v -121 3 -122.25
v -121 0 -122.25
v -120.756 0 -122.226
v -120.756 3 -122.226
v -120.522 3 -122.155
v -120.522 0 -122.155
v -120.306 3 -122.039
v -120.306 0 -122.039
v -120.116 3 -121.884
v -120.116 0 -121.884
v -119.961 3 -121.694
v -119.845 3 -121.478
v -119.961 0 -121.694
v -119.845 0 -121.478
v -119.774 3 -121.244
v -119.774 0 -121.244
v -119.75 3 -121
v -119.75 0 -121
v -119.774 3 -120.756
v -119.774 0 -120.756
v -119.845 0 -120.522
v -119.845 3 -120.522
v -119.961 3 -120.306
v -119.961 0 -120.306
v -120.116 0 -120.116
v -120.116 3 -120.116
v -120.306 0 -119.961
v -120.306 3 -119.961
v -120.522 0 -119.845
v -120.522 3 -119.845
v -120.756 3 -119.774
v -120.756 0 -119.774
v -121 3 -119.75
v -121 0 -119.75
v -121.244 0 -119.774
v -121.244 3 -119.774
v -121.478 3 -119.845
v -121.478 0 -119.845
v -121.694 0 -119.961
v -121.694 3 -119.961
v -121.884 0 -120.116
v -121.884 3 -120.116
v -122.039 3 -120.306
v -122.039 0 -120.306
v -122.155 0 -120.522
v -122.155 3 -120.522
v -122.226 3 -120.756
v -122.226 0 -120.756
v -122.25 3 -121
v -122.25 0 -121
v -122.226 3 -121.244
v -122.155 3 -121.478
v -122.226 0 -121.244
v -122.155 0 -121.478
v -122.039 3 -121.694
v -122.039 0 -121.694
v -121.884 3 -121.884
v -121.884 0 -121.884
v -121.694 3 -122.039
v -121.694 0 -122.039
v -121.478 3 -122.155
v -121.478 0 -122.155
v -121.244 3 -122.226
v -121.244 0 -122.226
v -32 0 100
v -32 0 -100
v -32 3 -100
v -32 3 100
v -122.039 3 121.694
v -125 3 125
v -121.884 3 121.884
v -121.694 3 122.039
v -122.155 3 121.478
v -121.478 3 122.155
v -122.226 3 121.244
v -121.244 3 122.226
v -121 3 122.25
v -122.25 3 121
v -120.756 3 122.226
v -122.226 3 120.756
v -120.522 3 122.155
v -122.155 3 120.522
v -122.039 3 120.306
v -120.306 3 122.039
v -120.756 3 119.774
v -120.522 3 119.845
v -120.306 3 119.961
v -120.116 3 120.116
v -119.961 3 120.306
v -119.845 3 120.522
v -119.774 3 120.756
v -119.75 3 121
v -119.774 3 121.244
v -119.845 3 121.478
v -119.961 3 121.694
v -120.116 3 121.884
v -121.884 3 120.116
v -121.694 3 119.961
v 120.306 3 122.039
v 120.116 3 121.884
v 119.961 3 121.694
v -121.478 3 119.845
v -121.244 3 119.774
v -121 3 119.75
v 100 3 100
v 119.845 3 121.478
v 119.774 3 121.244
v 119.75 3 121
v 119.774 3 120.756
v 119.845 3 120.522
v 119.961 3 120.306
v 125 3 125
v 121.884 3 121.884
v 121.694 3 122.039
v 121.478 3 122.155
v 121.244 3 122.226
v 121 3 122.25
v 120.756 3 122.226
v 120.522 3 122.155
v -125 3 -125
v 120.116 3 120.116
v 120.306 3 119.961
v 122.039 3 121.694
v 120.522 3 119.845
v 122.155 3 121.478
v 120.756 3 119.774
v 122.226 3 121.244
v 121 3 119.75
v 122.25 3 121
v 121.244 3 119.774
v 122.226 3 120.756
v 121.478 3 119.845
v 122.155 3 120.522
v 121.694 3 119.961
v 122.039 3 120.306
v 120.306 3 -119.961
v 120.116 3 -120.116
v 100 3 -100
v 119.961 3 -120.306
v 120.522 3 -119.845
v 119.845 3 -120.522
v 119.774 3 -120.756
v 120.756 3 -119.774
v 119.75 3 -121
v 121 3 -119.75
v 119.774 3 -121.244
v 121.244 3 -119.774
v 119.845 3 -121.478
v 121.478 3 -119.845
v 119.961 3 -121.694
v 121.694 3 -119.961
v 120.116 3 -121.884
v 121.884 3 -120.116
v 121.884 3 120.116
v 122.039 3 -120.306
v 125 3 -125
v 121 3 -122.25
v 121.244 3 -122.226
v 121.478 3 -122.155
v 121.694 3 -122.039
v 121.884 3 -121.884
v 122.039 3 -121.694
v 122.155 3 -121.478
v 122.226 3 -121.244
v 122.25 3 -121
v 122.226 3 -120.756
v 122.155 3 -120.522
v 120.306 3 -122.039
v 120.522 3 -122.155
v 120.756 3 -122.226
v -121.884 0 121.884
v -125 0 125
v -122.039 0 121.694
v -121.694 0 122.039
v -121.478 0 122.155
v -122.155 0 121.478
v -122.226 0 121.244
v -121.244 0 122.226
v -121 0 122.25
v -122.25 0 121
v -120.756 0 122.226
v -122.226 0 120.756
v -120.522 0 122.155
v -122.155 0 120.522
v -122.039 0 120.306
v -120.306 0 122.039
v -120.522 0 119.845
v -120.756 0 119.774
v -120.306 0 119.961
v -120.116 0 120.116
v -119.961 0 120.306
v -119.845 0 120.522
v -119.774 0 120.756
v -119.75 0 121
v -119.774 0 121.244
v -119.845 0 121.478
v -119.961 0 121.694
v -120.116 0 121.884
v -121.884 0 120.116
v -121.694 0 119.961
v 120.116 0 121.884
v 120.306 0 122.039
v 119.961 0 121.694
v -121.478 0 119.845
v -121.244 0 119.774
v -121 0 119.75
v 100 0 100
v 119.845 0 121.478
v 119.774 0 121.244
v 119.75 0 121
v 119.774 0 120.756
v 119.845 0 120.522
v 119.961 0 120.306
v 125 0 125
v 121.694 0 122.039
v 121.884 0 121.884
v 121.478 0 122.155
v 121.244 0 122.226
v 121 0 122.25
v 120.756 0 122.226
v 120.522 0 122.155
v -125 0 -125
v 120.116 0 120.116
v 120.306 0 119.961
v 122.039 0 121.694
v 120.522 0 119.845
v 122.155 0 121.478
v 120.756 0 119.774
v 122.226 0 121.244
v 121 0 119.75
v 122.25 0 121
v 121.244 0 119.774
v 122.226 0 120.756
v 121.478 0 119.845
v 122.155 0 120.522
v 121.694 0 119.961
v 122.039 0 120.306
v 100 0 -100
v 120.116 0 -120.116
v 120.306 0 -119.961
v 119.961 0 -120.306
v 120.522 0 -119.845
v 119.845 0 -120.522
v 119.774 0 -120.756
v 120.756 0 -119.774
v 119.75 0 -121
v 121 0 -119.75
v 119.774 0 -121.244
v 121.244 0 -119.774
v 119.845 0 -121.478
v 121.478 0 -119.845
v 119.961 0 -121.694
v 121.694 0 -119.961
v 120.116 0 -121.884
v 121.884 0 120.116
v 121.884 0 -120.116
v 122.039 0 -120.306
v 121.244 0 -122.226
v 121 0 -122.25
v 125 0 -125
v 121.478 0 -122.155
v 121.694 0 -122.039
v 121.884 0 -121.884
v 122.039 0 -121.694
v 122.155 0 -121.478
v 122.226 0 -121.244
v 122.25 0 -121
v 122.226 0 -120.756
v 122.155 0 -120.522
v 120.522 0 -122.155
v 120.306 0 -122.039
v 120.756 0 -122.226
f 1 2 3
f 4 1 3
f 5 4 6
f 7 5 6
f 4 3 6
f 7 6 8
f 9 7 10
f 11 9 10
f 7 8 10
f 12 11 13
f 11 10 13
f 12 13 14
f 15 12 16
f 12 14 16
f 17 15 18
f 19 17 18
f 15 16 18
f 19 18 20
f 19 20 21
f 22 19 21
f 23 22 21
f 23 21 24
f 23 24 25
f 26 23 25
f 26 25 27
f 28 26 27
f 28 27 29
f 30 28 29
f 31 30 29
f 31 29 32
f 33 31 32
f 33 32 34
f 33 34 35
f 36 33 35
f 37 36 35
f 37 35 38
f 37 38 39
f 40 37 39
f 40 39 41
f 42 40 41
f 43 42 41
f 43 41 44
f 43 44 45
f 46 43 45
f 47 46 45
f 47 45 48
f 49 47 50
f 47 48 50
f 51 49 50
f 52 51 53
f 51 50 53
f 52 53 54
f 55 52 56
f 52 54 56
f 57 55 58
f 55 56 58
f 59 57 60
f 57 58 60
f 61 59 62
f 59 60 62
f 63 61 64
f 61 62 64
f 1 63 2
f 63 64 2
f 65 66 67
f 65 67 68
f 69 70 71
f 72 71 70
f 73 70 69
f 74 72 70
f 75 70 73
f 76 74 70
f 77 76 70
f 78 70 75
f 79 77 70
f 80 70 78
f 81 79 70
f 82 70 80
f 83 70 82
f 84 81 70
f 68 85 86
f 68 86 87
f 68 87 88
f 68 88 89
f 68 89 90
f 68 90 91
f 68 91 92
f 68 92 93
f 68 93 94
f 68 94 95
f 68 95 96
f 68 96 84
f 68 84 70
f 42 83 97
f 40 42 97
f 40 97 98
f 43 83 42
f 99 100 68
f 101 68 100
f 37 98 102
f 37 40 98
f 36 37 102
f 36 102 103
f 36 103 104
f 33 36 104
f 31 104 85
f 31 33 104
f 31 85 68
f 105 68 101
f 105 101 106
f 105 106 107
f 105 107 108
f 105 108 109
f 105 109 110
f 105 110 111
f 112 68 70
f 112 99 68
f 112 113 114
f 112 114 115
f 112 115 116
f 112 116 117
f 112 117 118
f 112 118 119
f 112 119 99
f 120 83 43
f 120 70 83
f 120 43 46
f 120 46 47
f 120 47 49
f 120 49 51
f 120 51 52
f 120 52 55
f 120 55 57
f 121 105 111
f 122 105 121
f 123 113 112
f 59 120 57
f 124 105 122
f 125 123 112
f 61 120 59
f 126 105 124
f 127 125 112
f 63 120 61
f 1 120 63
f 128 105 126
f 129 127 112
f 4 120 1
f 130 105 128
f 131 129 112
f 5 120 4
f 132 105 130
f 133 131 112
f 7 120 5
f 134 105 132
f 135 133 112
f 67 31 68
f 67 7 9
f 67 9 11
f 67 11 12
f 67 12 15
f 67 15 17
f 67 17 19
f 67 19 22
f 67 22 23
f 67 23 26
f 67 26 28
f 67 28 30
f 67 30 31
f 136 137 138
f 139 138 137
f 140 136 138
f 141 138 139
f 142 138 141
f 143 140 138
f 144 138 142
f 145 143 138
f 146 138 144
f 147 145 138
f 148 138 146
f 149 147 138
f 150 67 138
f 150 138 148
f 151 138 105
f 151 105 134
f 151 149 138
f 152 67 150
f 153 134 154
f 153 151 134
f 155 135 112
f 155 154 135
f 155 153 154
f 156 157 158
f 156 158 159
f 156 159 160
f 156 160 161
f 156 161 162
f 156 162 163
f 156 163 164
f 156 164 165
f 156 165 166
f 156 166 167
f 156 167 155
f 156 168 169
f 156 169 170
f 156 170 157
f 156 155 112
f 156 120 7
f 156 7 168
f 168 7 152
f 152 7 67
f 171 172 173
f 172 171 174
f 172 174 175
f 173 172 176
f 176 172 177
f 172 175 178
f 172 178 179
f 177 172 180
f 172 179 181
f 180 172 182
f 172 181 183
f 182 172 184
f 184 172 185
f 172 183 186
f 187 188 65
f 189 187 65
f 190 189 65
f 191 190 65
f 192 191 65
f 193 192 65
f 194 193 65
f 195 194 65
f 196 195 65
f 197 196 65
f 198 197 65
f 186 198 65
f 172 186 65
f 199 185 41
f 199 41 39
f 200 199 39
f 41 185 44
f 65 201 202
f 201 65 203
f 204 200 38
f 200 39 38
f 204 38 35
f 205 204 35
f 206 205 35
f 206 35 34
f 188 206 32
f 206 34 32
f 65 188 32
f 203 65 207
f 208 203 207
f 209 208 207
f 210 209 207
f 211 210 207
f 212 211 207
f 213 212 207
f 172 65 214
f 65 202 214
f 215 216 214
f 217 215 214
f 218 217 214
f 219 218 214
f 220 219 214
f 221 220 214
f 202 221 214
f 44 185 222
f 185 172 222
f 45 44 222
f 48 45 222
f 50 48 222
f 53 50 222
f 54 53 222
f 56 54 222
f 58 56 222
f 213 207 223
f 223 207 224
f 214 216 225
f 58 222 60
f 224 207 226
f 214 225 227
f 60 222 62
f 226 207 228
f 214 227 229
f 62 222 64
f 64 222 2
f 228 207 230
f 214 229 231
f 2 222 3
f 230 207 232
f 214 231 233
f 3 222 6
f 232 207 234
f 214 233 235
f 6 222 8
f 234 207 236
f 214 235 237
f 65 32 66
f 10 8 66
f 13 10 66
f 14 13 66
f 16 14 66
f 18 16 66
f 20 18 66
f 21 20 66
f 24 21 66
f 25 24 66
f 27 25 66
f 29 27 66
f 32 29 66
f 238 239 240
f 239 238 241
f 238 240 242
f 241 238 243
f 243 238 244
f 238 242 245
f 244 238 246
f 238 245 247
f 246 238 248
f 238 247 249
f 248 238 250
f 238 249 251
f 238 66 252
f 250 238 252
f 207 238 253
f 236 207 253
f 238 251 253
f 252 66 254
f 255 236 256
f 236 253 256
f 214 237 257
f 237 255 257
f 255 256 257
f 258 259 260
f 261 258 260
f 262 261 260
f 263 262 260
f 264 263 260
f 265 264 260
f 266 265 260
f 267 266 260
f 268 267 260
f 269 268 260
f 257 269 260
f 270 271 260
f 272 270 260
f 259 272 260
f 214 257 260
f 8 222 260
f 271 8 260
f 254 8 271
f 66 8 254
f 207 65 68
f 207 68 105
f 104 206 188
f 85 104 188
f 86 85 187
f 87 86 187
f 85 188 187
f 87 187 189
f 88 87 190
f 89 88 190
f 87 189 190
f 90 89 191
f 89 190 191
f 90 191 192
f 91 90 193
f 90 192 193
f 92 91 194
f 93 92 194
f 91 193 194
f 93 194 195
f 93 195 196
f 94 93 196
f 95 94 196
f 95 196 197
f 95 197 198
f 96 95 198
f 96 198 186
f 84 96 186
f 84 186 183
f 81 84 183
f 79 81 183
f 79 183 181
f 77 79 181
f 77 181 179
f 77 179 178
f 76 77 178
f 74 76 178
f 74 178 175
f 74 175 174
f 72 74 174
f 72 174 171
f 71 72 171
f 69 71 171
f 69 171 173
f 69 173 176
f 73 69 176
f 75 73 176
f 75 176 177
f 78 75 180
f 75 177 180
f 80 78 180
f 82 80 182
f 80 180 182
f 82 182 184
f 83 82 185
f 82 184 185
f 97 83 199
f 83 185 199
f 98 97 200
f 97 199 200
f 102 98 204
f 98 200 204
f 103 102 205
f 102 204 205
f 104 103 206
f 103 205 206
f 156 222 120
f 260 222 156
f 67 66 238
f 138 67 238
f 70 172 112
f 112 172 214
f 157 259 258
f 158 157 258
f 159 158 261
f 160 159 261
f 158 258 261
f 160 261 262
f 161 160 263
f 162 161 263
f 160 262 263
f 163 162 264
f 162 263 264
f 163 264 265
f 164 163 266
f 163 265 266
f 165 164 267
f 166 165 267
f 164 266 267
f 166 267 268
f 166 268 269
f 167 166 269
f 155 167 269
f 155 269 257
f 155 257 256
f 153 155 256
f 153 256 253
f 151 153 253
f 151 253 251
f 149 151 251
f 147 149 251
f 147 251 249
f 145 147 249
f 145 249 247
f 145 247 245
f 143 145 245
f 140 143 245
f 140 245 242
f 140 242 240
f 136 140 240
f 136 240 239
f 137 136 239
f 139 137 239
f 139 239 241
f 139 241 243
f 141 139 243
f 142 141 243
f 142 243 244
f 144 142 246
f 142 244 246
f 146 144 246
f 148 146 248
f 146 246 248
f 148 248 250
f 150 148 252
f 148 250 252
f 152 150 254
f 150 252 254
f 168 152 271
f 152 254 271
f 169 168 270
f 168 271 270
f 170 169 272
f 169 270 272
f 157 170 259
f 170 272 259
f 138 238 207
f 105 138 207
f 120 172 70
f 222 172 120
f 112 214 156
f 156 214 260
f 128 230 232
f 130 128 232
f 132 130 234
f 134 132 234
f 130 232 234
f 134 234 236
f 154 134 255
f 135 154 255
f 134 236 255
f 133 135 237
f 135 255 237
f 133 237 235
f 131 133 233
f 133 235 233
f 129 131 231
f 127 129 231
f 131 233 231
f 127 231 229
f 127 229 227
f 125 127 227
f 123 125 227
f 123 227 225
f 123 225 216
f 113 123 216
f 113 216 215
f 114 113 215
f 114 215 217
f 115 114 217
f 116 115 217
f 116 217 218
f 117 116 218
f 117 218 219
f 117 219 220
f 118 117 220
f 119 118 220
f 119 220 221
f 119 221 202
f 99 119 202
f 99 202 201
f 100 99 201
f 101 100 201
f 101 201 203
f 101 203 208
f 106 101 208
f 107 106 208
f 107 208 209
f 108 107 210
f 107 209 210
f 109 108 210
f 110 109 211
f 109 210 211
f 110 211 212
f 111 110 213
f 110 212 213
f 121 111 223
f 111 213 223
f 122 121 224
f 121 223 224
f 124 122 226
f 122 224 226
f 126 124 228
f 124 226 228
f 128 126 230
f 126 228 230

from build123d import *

# Parameters (mm, degrees)
SKETCH_1_W          = 250
SKETCH_1_H          = 250
EXTRUDE_1_DEPTH     = 3
SKETCH_3_W          = 132
SKETCH_3_H          = 200
CUT_EXTRUDE_1_DEPTH = 10
SKETCH_4_R          = 1.25
CUT_EXTRUDE_2_DEPTH = 10


with BuildPart() as part:
    # Эскиз1 → Бобышка-Вытянуть1 (new body)
    with BuildSketch(Plane(origin=(0, 0, 0), x_dir=(1, 0, 0), z_dir=(0, 1, 0))):
        Rectangle(SKETCH_1_W, SKETCH_1_H)
    extrude(amount=EXTRUDE_1_DEPTH)

    # Эскиз3 → Вырез-Вытянуть1 (cut)
    with BuildSketch(Plane.XZ):
        with Locations((34, 0)):
            Rectangle(SKETCH_3_W, SKETCH_3_H)
    extrude(amount=-CUT_EXTRUDE_1_DEPTH, mode=Mode.SUBTRACT)

    # Эскиз4 → Вырез-Вытянуть2 (cut)
    with BuildSketch(Plane.XZ):
        with Locations(Location((-121, 121, 0), (0, 0, 270))):
            Circle(SKETCH_4_R)
        with Locations(Location((121, 121, 0), (0, 0, 270))):
            Circle(SKETCH_4_R)
        with Locations(Location((121, -121, 0), (0, 0, 270))):
            Circle(SKETCH_4_R)
        with Locations(Location((-121, -121, 0), (0, 0, 270))):
            Circle(SKETCH_4_R)
    extrude(amount=-CUT_EXTRUDE_2_DEPTH, mode=Mode.SUBTRACT)


solid = part.part
